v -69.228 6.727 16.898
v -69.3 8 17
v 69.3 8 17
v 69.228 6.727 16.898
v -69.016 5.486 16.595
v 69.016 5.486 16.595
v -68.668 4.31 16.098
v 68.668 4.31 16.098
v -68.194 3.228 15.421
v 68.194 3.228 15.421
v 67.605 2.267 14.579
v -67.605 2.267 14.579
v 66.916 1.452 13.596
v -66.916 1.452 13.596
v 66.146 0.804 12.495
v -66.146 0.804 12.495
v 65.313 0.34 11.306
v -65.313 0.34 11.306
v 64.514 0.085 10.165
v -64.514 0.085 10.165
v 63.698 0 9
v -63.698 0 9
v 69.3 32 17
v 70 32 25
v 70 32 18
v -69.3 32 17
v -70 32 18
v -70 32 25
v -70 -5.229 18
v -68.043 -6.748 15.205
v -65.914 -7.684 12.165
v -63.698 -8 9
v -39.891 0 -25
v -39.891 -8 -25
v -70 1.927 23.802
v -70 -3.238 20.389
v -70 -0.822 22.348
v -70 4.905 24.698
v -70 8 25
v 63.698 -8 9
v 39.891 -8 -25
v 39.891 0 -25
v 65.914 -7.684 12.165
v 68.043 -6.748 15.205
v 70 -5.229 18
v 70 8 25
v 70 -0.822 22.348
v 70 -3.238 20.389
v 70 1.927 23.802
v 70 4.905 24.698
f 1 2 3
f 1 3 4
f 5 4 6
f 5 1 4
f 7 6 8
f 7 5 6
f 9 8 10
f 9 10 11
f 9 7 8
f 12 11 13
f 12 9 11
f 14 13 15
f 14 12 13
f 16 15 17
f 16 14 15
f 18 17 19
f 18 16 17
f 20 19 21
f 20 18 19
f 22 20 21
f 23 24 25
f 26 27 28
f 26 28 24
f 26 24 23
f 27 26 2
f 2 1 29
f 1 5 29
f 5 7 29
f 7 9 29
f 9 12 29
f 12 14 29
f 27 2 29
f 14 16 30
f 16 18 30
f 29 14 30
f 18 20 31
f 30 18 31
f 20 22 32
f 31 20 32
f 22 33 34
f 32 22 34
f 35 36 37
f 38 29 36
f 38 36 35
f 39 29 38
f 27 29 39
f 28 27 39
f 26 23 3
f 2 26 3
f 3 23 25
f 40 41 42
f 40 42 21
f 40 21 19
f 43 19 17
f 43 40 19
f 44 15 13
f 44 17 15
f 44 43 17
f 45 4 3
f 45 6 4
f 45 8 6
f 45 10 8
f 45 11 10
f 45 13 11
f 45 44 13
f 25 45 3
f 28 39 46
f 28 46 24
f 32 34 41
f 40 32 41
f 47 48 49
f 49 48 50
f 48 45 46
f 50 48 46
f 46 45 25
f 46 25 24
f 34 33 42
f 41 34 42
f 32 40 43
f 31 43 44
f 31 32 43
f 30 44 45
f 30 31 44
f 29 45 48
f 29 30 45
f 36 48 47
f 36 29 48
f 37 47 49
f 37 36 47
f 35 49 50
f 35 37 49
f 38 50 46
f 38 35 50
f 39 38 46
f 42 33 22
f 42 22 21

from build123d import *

# Parameters (mm, degrees)
SKETCH1_W                    = 140
SKETCH1_H                    = 50
BASE_FLANGE1_DEPTH           = 8
EDGE_FLANGE1_STRIP_W         = 48
EDGE_FLANGE1_STRIP_H         = 8
EDGE_FLANGE1_STRIP_CUT_DEPTH = 140
EDGE_FLANGE1_DEPTH           = 140
CHAMFER1_SIZE                = 43
CHAMFER1_SIZE2               = 30.108924143
MIRROR2_START                = 47.016267246
MIRROR2_OUTLINE_W            = 55
MIRROR2_OUTLINE_H            = 41
MIRROR2_DEPTH                = 24.663786763


# Read off the part's stored shape, not the designer's step: Mirror2
# Sheet-metal steps are written as plain solids
with BuildPart() as part:
    # Sketch1 → Base-Flange1 (new body)
    with BuildSketch(Plane(origin=(0, 0, 0), x_dir=(1, 0, 0), z_dir=(0, 1, 0))):
        Rectangle(SKETCH1_W, SKETCH1_H)
    extrude(amount=-BASE_FLANGE1_DEPTH)

    # Edge-Flange1 strip (across the edge) → Edge-Flange1 strip cut (cut)
    with BuildSketch(Plane(origin=(-70, 0, 25), x_dir=(0, 0, -1), z_dir=(1, 0, 0))):
        with Locations((-8, -4)):
            Rectangle(EDGE_FLANGE1_STRIP_W, EDGE_FLANGE1_STRIP_H)
    extrude(amount=EDGE_FLANGE1_STRIP_CUT_DEPTH, mode=Mode.SUBTRACT)

    # Edge-Flange1 section (across the edge) → Edge-Flange1 (add)
    with BuildSketch(Plane(origin=(-70, 0, 25), x_dir=(0, 0, -1), z_dir=(1, 0, 0))):
        with BuildLine():
            Line((0, 8), (0, 32))
            Line((0, 32), (8, 32))
            Line((8, 32), (8, 8))
            ThreePointArc((8, 8), (10.343145751, 2.343145751), (16, 0))
            Line((16, 0), (16, -8))
            ThreePointArc((16, -8), (4.686291501, -3.313708499), (0, 8))
        make_face()
    extrude(amount=EDGE_FLANGE1_DEPTH)

    # Chamfer1
    chamfer1_edges = [part.edges().sort_by_distance(p)[0] for p in [
        (-70, -4, -25),
    ]]
    chamfer1_side = [part.faces().sort_by_distance(p)[0] for p in [
        (-70, -0.640312424, -8),
    ]]
    chamfer(chamfer1_edges, length=CHAMFER1_SIZE, length2=CHAMFER1_SIZE2, reference=chamfer1_side[0])

    # Mirror2 outline → Mirror2 (cut)
    with BuildSketch(Plane(origin=(0, 0, 0), x_dir=(0.5735764363510512, 0, 0.8191520442889882), z_dir=(0.8191520442889882, 0, -0.5735764363510512)).offset(MIRROR2_START)):
        with Locations((28.5, -12.5)):
            Rectangle(MIRROR2_OUTLINE_W, MIRROR2_OUTLINE_H)
    extrude(amount=MIRROR2_DEPTH, mode=Mode.SUBTRACT)


solid = part.part
